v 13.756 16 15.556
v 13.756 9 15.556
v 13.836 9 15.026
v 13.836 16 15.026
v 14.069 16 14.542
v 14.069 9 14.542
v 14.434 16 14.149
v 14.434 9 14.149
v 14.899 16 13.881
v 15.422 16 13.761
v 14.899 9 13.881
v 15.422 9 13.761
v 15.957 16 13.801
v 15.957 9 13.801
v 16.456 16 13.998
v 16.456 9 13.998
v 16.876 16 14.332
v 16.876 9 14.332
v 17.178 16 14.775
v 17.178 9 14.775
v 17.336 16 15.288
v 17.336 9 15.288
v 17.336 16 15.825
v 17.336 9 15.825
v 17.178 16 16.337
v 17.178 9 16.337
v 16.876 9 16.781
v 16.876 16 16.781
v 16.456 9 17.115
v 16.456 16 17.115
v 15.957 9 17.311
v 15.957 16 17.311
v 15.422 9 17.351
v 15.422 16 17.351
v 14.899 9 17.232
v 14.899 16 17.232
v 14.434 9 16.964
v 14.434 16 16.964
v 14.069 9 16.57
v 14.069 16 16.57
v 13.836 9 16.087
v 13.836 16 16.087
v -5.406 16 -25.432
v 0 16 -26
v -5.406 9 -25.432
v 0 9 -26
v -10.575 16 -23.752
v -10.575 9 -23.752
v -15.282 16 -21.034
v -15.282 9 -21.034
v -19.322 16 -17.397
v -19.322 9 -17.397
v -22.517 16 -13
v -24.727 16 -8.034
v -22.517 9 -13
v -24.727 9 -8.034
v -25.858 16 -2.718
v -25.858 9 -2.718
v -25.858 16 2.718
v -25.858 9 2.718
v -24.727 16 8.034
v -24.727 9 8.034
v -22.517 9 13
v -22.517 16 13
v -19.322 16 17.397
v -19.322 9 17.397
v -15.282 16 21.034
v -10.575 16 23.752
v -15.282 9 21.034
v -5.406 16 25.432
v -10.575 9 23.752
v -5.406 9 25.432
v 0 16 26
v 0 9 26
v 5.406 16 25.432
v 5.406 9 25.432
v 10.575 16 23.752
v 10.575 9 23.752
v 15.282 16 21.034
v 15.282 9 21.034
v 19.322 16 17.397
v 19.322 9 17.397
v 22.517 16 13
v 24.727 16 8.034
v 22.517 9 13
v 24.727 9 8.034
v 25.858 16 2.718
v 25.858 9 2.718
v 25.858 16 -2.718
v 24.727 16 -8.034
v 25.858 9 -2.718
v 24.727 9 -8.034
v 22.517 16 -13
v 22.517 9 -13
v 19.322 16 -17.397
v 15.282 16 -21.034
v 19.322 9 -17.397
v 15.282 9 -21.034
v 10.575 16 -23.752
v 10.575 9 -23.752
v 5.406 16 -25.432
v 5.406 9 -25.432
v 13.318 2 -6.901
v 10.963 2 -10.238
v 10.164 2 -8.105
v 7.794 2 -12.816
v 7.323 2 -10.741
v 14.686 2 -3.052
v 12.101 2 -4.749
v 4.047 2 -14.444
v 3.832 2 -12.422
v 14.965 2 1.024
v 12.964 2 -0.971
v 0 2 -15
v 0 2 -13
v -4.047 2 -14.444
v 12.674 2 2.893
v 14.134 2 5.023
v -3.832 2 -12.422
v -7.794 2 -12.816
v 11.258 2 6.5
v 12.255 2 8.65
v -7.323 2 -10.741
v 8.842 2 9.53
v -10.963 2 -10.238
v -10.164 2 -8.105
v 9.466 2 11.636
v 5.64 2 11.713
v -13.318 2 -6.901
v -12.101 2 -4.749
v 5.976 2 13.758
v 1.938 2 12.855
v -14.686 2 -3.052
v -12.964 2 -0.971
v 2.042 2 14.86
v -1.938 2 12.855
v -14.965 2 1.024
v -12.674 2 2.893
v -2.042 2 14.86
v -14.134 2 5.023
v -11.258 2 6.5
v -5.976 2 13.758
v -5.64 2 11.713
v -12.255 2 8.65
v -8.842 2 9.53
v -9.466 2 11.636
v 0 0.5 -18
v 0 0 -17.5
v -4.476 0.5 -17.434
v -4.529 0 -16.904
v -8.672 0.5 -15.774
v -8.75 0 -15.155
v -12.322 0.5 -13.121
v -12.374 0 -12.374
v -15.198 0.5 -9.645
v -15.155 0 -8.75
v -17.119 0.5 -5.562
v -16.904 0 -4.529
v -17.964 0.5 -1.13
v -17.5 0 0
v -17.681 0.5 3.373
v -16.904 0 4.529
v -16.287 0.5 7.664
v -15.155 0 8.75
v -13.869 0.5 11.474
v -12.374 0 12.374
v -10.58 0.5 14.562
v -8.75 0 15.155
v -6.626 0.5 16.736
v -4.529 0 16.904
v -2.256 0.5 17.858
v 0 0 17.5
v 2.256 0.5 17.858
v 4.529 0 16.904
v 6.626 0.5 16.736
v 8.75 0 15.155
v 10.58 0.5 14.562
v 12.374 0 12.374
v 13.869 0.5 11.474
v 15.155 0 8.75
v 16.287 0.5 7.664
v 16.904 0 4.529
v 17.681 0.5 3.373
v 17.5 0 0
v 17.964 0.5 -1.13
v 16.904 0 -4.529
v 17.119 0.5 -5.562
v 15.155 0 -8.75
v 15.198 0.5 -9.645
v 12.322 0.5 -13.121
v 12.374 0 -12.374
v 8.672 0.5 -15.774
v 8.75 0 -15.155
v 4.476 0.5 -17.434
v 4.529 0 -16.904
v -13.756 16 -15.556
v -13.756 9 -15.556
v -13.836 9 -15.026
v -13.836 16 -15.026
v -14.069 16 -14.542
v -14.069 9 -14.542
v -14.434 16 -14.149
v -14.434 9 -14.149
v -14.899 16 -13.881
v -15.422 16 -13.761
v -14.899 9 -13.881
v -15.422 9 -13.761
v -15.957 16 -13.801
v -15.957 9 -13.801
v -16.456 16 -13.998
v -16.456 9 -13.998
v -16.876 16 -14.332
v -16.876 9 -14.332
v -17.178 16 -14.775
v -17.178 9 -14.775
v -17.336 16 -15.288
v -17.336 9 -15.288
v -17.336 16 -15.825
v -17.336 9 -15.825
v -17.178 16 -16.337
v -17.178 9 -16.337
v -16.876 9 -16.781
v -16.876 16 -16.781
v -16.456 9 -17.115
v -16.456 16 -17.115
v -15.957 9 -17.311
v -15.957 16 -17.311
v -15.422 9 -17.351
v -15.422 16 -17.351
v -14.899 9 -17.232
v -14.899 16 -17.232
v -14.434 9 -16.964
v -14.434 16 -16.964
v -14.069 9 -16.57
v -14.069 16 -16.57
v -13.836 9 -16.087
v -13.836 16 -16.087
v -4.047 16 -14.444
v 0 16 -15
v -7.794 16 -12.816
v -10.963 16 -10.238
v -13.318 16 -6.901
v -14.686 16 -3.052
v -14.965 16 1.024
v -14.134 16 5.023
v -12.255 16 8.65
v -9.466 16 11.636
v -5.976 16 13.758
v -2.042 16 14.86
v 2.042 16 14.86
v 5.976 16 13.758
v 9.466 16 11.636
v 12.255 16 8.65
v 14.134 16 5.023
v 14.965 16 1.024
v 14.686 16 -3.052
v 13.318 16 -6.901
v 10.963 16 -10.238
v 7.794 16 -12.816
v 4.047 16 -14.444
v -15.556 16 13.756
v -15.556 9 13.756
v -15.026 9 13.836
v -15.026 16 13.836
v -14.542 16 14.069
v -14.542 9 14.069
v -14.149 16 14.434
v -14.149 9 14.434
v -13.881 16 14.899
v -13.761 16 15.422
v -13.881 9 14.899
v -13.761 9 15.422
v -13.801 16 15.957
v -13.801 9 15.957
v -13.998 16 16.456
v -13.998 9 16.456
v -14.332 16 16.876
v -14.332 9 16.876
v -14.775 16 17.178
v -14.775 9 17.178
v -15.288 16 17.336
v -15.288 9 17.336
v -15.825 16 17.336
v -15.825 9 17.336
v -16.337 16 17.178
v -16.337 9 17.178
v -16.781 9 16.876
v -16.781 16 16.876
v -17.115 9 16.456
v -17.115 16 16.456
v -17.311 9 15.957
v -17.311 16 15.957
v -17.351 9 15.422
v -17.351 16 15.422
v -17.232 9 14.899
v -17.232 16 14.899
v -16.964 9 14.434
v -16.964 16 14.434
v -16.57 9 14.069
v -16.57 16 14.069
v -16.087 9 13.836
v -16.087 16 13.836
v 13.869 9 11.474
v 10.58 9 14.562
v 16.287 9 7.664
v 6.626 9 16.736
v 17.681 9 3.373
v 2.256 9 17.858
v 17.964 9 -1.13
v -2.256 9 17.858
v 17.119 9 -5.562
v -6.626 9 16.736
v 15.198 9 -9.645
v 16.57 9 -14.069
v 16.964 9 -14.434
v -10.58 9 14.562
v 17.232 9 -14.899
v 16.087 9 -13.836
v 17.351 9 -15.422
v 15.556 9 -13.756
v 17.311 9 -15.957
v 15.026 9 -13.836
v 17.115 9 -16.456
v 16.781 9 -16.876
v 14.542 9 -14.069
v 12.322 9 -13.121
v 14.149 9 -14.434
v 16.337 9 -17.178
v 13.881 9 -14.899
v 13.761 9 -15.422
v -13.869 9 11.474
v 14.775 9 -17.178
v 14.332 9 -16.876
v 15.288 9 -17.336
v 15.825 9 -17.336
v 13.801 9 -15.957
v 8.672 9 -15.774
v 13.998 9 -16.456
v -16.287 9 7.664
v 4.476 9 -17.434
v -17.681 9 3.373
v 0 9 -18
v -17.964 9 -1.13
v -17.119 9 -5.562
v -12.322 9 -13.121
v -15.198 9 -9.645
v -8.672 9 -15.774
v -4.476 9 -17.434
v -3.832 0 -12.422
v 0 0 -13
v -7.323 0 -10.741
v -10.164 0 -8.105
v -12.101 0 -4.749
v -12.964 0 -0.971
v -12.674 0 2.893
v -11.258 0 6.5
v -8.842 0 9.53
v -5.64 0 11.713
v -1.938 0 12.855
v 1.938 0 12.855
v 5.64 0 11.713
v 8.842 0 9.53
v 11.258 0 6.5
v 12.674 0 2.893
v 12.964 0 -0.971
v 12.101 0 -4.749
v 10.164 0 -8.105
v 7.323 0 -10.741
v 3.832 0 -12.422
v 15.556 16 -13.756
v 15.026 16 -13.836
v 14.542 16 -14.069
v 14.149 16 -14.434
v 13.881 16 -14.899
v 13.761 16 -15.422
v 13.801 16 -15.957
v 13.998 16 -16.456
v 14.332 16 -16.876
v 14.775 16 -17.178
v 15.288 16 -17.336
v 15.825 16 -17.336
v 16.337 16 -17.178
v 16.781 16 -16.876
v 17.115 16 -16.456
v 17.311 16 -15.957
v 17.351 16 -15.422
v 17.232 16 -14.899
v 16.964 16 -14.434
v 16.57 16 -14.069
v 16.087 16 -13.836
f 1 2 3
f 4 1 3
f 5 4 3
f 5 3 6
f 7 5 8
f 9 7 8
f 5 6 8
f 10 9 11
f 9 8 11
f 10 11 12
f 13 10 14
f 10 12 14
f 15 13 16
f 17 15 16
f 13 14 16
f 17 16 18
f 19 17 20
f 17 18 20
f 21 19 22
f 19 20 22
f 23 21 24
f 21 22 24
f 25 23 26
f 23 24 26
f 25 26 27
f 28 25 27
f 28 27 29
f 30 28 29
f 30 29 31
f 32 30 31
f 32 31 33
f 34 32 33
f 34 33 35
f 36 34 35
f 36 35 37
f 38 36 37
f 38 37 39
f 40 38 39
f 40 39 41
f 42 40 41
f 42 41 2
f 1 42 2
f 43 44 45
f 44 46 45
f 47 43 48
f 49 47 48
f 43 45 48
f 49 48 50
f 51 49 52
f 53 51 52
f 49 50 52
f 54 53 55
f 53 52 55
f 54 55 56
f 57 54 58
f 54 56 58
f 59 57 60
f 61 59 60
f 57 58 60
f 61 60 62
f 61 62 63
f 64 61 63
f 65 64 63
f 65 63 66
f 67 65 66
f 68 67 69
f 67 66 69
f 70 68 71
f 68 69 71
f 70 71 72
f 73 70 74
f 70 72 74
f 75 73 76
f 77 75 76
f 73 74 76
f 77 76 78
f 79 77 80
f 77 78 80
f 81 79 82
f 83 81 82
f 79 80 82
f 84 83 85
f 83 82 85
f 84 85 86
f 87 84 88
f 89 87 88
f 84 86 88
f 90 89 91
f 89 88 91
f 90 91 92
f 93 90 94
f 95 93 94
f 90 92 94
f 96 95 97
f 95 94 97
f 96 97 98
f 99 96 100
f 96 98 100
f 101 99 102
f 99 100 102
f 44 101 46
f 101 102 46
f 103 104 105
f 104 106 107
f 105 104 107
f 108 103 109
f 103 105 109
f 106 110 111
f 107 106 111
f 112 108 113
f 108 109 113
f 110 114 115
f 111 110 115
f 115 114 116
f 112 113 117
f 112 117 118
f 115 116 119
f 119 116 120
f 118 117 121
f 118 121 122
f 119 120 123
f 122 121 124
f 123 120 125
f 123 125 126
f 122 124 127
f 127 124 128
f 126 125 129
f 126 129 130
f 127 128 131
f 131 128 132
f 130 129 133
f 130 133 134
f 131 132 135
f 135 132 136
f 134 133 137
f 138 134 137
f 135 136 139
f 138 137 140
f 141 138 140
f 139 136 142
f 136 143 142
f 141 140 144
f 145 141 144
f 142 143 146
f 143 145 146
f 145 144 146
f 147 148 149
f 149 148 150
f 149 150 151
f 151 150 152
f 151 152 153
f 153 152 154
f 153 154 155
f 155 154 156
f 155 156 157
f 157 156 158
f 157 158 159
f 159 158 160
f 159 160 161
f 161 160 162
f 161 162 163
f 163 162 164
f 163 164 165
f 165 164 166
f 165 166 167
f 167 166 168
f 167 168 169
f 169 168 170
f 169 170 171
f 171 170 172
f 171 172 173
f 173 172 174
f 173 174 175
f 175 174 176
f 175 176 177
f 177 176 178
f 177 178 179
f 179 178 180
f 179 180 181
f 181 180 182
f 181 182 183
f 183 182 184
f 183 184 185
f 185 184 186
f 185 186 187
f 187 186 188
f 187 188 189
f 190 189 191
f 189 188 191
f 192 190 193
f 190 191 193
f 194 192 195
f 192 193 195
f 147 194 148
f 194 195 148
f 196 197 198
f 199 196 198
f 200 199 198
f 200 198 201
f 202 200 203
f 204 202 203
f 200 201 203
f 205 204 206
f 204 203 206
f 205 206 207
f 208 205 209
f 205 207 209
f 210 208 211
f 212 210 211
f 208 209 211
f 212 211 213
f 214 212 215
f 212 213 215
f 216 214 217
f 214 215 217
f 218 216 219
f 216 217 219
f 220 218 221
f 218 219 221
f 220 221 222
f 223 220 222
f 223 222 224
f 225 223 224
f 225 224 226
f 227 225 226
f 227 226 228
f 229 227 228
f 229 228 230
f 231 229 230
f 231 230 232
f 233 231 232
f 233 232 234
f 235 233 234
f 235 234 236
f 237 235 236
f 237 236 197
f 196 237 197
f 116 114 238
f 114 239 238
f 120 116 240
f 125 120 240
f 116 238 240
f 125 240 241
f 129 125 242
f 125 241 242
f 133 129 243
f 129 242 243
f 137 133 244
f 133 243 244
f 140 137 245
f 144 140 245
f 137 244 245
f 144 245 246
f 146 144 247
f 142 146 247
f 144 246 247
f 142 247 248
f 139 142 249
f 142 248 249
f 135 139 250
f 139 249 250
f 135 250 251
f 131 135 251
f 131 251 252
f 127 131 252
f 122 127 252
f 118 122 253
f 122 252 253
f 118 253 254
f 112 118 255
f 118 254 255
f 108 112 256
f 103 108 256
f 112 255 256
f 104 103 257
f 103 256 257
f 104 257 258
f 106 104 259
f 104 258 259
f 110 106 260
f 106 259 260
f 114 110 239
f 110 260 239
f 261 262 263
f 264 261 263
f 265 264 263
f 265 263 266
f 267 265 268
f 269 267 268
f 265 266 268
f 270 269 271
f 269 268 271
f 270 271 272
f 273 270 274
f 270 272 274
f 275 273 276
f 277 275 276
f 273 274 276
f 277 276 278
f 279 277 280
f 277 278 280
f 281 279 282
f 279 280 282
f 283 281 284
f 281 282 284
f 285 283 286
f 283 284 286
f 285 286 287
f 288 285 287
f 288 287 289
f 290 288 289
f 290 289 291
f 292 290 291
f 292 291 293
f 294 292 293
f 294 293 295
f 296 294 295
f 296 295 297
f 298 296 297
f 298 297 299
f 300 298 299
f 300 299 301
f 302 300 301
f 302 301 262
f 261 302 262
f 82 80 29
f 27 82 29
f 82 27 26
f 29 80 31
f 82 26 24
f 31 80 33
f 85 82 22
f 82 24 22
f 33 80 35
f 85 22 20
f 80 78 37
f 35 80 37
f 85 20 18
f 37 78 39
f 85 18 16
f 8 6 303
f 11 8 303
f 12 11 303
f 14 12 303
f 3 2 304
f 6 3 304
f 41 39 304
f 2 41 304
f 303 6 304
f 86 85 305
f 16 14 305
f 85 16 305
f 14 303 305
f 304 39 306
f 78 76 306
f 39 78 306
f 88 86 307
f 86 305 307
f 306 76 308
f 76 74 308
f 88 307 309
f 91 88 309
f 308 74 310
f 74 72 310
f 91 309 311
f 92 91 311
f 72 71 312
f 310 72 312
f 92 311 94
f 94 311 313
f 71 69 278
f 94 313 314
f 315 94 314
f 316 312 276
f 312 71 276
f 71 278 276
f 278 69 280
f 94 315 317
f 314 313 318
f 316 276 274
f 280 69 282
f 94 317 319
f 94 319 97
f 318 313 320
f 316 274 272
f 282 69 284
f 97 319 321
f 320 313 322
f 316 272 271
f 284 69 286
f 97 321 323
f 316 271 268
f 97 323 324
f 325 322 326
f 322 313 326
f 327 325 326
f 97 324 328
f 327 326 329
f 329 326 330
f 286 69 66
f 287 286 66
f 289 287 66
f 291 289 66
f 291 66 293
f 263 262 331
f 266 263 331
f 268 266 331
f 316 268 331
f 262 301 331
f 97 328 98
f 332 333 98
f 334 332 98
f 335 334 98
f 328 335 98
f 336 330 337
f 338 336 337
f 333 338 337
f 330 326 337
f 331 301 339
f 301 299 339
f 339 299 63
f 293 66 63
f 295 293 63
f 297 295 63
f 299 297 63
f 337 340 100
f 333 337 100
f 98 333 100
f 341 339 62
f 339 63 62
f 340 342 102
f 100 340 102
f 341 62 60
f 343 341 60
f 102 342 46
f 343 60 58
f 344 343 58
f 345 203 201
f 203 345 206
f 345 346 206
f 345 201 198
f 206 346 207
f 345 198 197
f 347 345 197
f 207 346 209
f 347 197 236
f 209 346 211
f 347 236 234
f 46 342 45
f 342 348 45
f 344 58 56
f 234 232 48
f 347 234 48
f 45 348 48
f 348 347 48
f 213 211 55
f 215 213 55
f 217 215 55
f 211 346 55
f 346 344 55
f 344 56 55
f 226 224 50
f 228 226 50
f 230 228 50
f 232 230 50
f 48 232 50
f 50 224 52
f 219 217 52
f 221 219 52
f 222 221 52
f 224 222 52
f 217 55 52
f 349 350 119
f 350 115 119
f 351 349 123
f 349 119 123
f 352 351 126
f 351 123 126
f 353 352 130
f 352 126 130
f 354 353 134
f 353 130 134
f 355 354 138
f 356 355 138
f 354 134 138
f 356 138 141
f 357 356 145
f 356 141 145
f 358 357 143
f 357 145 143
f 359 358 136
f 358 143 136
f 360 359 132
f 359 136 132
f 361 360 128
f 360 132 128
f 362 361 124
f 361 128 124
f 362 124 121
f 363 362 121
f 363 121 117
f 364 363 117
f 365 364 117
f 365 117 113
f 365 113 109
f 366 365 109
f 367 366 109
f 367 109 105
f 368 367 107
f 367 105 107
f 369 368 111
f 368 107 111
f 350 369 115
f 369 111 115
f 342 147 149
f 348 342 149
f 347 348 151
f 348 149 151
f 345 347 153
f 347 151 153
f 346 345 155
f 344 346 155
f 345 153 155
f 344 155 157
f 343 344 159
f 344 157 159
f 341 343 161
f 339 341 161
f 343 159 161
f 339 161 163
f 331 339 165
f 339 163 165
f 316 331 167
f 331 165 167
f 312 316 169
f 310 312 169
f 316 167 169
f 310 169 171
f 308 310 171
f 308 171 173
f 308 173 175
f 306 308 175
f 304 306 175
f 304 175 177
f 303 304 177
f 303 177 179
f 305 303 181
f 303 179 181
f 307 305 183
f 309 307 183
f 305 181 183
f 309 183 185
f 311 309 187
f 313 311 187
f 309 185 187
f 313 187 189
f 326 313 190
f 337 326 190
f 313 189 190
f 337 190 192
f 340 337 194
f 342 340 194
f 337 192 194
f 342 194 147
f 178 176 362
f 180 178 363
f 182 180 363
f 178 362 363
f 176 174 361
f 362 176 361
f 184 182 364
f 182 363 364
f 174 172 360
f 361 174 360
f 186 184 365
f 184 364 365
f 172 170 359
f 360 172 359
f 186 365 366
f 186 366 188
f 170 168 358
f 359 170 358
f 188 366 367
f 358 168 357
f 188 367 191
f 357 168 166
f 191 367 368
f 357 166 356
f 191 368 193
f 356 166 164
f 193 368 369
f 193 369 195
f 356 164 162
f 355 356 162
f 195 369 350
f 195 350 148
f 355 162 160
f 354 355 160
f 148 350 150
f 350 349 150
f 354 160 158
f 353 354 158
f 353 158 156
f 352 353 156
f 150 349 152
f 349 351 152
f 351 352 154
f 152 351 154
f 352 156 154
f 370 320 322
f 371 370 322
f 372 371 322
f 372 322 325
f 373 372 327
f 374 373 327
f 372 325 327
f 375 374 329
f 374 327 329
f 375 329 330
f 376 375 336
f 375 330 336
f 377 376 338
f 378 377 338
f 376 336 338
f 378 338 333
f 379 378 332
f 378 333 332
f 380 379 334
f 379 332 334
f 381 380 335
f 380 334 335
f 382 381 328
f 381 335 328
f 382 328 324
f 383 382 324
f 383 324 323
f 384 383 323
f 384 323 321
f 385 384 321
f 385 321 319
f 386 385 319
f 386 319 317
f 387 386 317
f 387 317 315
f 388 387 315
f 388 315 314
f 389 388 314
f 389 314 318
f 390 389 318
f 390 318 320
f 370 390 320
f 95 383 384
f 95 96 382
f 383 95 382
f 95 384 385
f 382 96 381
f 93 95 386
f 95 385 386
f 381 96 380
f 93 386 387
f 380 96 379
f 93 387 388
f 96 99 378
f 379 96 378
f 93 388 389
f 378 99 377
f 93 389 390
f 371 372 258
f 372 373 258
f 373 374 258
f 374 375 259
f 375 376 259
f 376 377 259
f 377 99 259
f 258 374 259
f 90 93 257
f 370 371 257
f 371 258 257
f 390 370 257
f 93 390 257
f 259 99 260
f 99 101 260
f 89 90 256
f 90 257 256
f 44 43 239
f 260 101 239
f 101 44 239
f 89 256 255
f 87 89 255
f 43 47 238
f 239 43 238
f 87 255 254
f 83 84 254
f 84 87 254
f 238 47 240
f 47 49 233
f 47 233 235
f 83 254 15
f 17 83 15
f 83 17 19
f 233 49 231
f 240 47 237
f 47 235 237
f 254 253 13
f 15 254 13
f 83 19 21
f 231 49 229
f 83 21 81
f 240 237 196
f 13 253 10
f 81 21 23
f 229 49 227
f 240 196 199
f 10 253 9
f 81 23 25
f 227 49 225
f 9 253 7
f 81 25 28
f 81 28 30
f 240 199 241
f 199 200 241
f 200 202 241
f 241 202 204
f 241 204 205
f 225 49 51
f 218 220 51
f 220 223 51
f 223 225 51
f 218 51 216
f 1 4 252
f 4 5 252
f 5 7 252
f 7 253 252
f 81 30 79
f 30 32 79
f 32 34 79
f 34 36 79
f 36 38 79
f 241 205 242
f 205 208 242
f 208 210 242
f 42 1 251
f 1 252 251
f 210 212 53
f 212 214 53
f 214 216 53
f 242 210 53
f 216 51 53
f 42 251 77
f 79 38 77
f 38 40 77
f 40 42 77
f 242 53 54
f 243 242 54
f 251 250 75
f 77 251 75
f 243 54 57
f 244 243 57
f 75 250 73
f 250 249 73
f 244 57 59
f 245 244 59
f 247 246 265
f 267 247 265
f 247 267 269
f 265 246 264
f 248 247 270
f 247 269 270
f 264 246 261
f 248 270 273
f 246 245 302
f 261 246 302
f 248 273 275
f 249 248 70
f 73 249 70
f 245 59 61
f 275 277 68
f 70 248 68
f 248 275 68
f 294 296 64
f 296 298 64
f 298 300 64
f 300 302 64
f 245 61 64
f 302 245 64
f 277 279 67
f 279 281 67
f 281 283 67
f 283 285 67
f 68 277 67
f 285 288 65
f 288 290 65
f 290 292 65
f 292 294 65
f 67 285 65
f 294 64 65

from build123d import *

# Parameters (mm, degrees)
CHAMFER_1_SIZE           = 0.5
HOLE_WIZARD_M31_D        = 3.6
PATTERN_CIRCULAR_1_COUNT = 4


with BuildPart() as part:
    # Эскиз1 → Повернуть1 (revolve)
    with BuildSketch(Plane.XY, mode=Mode.PRIVATE) as revolve_1_sk:
        Polygon((-15, 2), (-15, 16), (-26, 16), (-26, 9), (-18, 9), (-18, 0), (-13, 0), (-13, 2), align=None)
    revolve(revolve_1_sk.sketch.rotate(Axis((0, 0, 0), (0, 1, 0)), 270), axis=Axis((0, 0, 0), (0, 1, 0)))

    # Фаска1
    chamfer_1_edges = [part.edges().sort_by_distance(p)[0] for p in [
        (0, 0, 18),
    ]]
    chamfer(chamfer_1_edges, length=CHAMFER_1_SIZE)

    # Отверстие с зазором M31 (through all)
    with Locations(Plane(origin=(0, 16, 0), x_dir=(1, 0, 0), z_dir=(0, 1, 0))):
        with Locations((15.556349186, -15.556349186)):
            hole_wizard_m31 = Hole(HOLE_WIZARD_M31_D / 2)

    # Круговой массив1: Отверстие с зазором M31 ×4 about axis
    pattern_circular_1_axis = Axis((0, 0, 0), (0, 1, 0))
    for i in range(1, PATTERN_CIRCULAR_1_COUNT):
        add(hole_wizard_m31.rotate(pattern_circular_1_axis, i * 360 / PATTERN_CIRCULAR_1_COUNT), mode=Mode.SUBTRACT)


solid = part.part
